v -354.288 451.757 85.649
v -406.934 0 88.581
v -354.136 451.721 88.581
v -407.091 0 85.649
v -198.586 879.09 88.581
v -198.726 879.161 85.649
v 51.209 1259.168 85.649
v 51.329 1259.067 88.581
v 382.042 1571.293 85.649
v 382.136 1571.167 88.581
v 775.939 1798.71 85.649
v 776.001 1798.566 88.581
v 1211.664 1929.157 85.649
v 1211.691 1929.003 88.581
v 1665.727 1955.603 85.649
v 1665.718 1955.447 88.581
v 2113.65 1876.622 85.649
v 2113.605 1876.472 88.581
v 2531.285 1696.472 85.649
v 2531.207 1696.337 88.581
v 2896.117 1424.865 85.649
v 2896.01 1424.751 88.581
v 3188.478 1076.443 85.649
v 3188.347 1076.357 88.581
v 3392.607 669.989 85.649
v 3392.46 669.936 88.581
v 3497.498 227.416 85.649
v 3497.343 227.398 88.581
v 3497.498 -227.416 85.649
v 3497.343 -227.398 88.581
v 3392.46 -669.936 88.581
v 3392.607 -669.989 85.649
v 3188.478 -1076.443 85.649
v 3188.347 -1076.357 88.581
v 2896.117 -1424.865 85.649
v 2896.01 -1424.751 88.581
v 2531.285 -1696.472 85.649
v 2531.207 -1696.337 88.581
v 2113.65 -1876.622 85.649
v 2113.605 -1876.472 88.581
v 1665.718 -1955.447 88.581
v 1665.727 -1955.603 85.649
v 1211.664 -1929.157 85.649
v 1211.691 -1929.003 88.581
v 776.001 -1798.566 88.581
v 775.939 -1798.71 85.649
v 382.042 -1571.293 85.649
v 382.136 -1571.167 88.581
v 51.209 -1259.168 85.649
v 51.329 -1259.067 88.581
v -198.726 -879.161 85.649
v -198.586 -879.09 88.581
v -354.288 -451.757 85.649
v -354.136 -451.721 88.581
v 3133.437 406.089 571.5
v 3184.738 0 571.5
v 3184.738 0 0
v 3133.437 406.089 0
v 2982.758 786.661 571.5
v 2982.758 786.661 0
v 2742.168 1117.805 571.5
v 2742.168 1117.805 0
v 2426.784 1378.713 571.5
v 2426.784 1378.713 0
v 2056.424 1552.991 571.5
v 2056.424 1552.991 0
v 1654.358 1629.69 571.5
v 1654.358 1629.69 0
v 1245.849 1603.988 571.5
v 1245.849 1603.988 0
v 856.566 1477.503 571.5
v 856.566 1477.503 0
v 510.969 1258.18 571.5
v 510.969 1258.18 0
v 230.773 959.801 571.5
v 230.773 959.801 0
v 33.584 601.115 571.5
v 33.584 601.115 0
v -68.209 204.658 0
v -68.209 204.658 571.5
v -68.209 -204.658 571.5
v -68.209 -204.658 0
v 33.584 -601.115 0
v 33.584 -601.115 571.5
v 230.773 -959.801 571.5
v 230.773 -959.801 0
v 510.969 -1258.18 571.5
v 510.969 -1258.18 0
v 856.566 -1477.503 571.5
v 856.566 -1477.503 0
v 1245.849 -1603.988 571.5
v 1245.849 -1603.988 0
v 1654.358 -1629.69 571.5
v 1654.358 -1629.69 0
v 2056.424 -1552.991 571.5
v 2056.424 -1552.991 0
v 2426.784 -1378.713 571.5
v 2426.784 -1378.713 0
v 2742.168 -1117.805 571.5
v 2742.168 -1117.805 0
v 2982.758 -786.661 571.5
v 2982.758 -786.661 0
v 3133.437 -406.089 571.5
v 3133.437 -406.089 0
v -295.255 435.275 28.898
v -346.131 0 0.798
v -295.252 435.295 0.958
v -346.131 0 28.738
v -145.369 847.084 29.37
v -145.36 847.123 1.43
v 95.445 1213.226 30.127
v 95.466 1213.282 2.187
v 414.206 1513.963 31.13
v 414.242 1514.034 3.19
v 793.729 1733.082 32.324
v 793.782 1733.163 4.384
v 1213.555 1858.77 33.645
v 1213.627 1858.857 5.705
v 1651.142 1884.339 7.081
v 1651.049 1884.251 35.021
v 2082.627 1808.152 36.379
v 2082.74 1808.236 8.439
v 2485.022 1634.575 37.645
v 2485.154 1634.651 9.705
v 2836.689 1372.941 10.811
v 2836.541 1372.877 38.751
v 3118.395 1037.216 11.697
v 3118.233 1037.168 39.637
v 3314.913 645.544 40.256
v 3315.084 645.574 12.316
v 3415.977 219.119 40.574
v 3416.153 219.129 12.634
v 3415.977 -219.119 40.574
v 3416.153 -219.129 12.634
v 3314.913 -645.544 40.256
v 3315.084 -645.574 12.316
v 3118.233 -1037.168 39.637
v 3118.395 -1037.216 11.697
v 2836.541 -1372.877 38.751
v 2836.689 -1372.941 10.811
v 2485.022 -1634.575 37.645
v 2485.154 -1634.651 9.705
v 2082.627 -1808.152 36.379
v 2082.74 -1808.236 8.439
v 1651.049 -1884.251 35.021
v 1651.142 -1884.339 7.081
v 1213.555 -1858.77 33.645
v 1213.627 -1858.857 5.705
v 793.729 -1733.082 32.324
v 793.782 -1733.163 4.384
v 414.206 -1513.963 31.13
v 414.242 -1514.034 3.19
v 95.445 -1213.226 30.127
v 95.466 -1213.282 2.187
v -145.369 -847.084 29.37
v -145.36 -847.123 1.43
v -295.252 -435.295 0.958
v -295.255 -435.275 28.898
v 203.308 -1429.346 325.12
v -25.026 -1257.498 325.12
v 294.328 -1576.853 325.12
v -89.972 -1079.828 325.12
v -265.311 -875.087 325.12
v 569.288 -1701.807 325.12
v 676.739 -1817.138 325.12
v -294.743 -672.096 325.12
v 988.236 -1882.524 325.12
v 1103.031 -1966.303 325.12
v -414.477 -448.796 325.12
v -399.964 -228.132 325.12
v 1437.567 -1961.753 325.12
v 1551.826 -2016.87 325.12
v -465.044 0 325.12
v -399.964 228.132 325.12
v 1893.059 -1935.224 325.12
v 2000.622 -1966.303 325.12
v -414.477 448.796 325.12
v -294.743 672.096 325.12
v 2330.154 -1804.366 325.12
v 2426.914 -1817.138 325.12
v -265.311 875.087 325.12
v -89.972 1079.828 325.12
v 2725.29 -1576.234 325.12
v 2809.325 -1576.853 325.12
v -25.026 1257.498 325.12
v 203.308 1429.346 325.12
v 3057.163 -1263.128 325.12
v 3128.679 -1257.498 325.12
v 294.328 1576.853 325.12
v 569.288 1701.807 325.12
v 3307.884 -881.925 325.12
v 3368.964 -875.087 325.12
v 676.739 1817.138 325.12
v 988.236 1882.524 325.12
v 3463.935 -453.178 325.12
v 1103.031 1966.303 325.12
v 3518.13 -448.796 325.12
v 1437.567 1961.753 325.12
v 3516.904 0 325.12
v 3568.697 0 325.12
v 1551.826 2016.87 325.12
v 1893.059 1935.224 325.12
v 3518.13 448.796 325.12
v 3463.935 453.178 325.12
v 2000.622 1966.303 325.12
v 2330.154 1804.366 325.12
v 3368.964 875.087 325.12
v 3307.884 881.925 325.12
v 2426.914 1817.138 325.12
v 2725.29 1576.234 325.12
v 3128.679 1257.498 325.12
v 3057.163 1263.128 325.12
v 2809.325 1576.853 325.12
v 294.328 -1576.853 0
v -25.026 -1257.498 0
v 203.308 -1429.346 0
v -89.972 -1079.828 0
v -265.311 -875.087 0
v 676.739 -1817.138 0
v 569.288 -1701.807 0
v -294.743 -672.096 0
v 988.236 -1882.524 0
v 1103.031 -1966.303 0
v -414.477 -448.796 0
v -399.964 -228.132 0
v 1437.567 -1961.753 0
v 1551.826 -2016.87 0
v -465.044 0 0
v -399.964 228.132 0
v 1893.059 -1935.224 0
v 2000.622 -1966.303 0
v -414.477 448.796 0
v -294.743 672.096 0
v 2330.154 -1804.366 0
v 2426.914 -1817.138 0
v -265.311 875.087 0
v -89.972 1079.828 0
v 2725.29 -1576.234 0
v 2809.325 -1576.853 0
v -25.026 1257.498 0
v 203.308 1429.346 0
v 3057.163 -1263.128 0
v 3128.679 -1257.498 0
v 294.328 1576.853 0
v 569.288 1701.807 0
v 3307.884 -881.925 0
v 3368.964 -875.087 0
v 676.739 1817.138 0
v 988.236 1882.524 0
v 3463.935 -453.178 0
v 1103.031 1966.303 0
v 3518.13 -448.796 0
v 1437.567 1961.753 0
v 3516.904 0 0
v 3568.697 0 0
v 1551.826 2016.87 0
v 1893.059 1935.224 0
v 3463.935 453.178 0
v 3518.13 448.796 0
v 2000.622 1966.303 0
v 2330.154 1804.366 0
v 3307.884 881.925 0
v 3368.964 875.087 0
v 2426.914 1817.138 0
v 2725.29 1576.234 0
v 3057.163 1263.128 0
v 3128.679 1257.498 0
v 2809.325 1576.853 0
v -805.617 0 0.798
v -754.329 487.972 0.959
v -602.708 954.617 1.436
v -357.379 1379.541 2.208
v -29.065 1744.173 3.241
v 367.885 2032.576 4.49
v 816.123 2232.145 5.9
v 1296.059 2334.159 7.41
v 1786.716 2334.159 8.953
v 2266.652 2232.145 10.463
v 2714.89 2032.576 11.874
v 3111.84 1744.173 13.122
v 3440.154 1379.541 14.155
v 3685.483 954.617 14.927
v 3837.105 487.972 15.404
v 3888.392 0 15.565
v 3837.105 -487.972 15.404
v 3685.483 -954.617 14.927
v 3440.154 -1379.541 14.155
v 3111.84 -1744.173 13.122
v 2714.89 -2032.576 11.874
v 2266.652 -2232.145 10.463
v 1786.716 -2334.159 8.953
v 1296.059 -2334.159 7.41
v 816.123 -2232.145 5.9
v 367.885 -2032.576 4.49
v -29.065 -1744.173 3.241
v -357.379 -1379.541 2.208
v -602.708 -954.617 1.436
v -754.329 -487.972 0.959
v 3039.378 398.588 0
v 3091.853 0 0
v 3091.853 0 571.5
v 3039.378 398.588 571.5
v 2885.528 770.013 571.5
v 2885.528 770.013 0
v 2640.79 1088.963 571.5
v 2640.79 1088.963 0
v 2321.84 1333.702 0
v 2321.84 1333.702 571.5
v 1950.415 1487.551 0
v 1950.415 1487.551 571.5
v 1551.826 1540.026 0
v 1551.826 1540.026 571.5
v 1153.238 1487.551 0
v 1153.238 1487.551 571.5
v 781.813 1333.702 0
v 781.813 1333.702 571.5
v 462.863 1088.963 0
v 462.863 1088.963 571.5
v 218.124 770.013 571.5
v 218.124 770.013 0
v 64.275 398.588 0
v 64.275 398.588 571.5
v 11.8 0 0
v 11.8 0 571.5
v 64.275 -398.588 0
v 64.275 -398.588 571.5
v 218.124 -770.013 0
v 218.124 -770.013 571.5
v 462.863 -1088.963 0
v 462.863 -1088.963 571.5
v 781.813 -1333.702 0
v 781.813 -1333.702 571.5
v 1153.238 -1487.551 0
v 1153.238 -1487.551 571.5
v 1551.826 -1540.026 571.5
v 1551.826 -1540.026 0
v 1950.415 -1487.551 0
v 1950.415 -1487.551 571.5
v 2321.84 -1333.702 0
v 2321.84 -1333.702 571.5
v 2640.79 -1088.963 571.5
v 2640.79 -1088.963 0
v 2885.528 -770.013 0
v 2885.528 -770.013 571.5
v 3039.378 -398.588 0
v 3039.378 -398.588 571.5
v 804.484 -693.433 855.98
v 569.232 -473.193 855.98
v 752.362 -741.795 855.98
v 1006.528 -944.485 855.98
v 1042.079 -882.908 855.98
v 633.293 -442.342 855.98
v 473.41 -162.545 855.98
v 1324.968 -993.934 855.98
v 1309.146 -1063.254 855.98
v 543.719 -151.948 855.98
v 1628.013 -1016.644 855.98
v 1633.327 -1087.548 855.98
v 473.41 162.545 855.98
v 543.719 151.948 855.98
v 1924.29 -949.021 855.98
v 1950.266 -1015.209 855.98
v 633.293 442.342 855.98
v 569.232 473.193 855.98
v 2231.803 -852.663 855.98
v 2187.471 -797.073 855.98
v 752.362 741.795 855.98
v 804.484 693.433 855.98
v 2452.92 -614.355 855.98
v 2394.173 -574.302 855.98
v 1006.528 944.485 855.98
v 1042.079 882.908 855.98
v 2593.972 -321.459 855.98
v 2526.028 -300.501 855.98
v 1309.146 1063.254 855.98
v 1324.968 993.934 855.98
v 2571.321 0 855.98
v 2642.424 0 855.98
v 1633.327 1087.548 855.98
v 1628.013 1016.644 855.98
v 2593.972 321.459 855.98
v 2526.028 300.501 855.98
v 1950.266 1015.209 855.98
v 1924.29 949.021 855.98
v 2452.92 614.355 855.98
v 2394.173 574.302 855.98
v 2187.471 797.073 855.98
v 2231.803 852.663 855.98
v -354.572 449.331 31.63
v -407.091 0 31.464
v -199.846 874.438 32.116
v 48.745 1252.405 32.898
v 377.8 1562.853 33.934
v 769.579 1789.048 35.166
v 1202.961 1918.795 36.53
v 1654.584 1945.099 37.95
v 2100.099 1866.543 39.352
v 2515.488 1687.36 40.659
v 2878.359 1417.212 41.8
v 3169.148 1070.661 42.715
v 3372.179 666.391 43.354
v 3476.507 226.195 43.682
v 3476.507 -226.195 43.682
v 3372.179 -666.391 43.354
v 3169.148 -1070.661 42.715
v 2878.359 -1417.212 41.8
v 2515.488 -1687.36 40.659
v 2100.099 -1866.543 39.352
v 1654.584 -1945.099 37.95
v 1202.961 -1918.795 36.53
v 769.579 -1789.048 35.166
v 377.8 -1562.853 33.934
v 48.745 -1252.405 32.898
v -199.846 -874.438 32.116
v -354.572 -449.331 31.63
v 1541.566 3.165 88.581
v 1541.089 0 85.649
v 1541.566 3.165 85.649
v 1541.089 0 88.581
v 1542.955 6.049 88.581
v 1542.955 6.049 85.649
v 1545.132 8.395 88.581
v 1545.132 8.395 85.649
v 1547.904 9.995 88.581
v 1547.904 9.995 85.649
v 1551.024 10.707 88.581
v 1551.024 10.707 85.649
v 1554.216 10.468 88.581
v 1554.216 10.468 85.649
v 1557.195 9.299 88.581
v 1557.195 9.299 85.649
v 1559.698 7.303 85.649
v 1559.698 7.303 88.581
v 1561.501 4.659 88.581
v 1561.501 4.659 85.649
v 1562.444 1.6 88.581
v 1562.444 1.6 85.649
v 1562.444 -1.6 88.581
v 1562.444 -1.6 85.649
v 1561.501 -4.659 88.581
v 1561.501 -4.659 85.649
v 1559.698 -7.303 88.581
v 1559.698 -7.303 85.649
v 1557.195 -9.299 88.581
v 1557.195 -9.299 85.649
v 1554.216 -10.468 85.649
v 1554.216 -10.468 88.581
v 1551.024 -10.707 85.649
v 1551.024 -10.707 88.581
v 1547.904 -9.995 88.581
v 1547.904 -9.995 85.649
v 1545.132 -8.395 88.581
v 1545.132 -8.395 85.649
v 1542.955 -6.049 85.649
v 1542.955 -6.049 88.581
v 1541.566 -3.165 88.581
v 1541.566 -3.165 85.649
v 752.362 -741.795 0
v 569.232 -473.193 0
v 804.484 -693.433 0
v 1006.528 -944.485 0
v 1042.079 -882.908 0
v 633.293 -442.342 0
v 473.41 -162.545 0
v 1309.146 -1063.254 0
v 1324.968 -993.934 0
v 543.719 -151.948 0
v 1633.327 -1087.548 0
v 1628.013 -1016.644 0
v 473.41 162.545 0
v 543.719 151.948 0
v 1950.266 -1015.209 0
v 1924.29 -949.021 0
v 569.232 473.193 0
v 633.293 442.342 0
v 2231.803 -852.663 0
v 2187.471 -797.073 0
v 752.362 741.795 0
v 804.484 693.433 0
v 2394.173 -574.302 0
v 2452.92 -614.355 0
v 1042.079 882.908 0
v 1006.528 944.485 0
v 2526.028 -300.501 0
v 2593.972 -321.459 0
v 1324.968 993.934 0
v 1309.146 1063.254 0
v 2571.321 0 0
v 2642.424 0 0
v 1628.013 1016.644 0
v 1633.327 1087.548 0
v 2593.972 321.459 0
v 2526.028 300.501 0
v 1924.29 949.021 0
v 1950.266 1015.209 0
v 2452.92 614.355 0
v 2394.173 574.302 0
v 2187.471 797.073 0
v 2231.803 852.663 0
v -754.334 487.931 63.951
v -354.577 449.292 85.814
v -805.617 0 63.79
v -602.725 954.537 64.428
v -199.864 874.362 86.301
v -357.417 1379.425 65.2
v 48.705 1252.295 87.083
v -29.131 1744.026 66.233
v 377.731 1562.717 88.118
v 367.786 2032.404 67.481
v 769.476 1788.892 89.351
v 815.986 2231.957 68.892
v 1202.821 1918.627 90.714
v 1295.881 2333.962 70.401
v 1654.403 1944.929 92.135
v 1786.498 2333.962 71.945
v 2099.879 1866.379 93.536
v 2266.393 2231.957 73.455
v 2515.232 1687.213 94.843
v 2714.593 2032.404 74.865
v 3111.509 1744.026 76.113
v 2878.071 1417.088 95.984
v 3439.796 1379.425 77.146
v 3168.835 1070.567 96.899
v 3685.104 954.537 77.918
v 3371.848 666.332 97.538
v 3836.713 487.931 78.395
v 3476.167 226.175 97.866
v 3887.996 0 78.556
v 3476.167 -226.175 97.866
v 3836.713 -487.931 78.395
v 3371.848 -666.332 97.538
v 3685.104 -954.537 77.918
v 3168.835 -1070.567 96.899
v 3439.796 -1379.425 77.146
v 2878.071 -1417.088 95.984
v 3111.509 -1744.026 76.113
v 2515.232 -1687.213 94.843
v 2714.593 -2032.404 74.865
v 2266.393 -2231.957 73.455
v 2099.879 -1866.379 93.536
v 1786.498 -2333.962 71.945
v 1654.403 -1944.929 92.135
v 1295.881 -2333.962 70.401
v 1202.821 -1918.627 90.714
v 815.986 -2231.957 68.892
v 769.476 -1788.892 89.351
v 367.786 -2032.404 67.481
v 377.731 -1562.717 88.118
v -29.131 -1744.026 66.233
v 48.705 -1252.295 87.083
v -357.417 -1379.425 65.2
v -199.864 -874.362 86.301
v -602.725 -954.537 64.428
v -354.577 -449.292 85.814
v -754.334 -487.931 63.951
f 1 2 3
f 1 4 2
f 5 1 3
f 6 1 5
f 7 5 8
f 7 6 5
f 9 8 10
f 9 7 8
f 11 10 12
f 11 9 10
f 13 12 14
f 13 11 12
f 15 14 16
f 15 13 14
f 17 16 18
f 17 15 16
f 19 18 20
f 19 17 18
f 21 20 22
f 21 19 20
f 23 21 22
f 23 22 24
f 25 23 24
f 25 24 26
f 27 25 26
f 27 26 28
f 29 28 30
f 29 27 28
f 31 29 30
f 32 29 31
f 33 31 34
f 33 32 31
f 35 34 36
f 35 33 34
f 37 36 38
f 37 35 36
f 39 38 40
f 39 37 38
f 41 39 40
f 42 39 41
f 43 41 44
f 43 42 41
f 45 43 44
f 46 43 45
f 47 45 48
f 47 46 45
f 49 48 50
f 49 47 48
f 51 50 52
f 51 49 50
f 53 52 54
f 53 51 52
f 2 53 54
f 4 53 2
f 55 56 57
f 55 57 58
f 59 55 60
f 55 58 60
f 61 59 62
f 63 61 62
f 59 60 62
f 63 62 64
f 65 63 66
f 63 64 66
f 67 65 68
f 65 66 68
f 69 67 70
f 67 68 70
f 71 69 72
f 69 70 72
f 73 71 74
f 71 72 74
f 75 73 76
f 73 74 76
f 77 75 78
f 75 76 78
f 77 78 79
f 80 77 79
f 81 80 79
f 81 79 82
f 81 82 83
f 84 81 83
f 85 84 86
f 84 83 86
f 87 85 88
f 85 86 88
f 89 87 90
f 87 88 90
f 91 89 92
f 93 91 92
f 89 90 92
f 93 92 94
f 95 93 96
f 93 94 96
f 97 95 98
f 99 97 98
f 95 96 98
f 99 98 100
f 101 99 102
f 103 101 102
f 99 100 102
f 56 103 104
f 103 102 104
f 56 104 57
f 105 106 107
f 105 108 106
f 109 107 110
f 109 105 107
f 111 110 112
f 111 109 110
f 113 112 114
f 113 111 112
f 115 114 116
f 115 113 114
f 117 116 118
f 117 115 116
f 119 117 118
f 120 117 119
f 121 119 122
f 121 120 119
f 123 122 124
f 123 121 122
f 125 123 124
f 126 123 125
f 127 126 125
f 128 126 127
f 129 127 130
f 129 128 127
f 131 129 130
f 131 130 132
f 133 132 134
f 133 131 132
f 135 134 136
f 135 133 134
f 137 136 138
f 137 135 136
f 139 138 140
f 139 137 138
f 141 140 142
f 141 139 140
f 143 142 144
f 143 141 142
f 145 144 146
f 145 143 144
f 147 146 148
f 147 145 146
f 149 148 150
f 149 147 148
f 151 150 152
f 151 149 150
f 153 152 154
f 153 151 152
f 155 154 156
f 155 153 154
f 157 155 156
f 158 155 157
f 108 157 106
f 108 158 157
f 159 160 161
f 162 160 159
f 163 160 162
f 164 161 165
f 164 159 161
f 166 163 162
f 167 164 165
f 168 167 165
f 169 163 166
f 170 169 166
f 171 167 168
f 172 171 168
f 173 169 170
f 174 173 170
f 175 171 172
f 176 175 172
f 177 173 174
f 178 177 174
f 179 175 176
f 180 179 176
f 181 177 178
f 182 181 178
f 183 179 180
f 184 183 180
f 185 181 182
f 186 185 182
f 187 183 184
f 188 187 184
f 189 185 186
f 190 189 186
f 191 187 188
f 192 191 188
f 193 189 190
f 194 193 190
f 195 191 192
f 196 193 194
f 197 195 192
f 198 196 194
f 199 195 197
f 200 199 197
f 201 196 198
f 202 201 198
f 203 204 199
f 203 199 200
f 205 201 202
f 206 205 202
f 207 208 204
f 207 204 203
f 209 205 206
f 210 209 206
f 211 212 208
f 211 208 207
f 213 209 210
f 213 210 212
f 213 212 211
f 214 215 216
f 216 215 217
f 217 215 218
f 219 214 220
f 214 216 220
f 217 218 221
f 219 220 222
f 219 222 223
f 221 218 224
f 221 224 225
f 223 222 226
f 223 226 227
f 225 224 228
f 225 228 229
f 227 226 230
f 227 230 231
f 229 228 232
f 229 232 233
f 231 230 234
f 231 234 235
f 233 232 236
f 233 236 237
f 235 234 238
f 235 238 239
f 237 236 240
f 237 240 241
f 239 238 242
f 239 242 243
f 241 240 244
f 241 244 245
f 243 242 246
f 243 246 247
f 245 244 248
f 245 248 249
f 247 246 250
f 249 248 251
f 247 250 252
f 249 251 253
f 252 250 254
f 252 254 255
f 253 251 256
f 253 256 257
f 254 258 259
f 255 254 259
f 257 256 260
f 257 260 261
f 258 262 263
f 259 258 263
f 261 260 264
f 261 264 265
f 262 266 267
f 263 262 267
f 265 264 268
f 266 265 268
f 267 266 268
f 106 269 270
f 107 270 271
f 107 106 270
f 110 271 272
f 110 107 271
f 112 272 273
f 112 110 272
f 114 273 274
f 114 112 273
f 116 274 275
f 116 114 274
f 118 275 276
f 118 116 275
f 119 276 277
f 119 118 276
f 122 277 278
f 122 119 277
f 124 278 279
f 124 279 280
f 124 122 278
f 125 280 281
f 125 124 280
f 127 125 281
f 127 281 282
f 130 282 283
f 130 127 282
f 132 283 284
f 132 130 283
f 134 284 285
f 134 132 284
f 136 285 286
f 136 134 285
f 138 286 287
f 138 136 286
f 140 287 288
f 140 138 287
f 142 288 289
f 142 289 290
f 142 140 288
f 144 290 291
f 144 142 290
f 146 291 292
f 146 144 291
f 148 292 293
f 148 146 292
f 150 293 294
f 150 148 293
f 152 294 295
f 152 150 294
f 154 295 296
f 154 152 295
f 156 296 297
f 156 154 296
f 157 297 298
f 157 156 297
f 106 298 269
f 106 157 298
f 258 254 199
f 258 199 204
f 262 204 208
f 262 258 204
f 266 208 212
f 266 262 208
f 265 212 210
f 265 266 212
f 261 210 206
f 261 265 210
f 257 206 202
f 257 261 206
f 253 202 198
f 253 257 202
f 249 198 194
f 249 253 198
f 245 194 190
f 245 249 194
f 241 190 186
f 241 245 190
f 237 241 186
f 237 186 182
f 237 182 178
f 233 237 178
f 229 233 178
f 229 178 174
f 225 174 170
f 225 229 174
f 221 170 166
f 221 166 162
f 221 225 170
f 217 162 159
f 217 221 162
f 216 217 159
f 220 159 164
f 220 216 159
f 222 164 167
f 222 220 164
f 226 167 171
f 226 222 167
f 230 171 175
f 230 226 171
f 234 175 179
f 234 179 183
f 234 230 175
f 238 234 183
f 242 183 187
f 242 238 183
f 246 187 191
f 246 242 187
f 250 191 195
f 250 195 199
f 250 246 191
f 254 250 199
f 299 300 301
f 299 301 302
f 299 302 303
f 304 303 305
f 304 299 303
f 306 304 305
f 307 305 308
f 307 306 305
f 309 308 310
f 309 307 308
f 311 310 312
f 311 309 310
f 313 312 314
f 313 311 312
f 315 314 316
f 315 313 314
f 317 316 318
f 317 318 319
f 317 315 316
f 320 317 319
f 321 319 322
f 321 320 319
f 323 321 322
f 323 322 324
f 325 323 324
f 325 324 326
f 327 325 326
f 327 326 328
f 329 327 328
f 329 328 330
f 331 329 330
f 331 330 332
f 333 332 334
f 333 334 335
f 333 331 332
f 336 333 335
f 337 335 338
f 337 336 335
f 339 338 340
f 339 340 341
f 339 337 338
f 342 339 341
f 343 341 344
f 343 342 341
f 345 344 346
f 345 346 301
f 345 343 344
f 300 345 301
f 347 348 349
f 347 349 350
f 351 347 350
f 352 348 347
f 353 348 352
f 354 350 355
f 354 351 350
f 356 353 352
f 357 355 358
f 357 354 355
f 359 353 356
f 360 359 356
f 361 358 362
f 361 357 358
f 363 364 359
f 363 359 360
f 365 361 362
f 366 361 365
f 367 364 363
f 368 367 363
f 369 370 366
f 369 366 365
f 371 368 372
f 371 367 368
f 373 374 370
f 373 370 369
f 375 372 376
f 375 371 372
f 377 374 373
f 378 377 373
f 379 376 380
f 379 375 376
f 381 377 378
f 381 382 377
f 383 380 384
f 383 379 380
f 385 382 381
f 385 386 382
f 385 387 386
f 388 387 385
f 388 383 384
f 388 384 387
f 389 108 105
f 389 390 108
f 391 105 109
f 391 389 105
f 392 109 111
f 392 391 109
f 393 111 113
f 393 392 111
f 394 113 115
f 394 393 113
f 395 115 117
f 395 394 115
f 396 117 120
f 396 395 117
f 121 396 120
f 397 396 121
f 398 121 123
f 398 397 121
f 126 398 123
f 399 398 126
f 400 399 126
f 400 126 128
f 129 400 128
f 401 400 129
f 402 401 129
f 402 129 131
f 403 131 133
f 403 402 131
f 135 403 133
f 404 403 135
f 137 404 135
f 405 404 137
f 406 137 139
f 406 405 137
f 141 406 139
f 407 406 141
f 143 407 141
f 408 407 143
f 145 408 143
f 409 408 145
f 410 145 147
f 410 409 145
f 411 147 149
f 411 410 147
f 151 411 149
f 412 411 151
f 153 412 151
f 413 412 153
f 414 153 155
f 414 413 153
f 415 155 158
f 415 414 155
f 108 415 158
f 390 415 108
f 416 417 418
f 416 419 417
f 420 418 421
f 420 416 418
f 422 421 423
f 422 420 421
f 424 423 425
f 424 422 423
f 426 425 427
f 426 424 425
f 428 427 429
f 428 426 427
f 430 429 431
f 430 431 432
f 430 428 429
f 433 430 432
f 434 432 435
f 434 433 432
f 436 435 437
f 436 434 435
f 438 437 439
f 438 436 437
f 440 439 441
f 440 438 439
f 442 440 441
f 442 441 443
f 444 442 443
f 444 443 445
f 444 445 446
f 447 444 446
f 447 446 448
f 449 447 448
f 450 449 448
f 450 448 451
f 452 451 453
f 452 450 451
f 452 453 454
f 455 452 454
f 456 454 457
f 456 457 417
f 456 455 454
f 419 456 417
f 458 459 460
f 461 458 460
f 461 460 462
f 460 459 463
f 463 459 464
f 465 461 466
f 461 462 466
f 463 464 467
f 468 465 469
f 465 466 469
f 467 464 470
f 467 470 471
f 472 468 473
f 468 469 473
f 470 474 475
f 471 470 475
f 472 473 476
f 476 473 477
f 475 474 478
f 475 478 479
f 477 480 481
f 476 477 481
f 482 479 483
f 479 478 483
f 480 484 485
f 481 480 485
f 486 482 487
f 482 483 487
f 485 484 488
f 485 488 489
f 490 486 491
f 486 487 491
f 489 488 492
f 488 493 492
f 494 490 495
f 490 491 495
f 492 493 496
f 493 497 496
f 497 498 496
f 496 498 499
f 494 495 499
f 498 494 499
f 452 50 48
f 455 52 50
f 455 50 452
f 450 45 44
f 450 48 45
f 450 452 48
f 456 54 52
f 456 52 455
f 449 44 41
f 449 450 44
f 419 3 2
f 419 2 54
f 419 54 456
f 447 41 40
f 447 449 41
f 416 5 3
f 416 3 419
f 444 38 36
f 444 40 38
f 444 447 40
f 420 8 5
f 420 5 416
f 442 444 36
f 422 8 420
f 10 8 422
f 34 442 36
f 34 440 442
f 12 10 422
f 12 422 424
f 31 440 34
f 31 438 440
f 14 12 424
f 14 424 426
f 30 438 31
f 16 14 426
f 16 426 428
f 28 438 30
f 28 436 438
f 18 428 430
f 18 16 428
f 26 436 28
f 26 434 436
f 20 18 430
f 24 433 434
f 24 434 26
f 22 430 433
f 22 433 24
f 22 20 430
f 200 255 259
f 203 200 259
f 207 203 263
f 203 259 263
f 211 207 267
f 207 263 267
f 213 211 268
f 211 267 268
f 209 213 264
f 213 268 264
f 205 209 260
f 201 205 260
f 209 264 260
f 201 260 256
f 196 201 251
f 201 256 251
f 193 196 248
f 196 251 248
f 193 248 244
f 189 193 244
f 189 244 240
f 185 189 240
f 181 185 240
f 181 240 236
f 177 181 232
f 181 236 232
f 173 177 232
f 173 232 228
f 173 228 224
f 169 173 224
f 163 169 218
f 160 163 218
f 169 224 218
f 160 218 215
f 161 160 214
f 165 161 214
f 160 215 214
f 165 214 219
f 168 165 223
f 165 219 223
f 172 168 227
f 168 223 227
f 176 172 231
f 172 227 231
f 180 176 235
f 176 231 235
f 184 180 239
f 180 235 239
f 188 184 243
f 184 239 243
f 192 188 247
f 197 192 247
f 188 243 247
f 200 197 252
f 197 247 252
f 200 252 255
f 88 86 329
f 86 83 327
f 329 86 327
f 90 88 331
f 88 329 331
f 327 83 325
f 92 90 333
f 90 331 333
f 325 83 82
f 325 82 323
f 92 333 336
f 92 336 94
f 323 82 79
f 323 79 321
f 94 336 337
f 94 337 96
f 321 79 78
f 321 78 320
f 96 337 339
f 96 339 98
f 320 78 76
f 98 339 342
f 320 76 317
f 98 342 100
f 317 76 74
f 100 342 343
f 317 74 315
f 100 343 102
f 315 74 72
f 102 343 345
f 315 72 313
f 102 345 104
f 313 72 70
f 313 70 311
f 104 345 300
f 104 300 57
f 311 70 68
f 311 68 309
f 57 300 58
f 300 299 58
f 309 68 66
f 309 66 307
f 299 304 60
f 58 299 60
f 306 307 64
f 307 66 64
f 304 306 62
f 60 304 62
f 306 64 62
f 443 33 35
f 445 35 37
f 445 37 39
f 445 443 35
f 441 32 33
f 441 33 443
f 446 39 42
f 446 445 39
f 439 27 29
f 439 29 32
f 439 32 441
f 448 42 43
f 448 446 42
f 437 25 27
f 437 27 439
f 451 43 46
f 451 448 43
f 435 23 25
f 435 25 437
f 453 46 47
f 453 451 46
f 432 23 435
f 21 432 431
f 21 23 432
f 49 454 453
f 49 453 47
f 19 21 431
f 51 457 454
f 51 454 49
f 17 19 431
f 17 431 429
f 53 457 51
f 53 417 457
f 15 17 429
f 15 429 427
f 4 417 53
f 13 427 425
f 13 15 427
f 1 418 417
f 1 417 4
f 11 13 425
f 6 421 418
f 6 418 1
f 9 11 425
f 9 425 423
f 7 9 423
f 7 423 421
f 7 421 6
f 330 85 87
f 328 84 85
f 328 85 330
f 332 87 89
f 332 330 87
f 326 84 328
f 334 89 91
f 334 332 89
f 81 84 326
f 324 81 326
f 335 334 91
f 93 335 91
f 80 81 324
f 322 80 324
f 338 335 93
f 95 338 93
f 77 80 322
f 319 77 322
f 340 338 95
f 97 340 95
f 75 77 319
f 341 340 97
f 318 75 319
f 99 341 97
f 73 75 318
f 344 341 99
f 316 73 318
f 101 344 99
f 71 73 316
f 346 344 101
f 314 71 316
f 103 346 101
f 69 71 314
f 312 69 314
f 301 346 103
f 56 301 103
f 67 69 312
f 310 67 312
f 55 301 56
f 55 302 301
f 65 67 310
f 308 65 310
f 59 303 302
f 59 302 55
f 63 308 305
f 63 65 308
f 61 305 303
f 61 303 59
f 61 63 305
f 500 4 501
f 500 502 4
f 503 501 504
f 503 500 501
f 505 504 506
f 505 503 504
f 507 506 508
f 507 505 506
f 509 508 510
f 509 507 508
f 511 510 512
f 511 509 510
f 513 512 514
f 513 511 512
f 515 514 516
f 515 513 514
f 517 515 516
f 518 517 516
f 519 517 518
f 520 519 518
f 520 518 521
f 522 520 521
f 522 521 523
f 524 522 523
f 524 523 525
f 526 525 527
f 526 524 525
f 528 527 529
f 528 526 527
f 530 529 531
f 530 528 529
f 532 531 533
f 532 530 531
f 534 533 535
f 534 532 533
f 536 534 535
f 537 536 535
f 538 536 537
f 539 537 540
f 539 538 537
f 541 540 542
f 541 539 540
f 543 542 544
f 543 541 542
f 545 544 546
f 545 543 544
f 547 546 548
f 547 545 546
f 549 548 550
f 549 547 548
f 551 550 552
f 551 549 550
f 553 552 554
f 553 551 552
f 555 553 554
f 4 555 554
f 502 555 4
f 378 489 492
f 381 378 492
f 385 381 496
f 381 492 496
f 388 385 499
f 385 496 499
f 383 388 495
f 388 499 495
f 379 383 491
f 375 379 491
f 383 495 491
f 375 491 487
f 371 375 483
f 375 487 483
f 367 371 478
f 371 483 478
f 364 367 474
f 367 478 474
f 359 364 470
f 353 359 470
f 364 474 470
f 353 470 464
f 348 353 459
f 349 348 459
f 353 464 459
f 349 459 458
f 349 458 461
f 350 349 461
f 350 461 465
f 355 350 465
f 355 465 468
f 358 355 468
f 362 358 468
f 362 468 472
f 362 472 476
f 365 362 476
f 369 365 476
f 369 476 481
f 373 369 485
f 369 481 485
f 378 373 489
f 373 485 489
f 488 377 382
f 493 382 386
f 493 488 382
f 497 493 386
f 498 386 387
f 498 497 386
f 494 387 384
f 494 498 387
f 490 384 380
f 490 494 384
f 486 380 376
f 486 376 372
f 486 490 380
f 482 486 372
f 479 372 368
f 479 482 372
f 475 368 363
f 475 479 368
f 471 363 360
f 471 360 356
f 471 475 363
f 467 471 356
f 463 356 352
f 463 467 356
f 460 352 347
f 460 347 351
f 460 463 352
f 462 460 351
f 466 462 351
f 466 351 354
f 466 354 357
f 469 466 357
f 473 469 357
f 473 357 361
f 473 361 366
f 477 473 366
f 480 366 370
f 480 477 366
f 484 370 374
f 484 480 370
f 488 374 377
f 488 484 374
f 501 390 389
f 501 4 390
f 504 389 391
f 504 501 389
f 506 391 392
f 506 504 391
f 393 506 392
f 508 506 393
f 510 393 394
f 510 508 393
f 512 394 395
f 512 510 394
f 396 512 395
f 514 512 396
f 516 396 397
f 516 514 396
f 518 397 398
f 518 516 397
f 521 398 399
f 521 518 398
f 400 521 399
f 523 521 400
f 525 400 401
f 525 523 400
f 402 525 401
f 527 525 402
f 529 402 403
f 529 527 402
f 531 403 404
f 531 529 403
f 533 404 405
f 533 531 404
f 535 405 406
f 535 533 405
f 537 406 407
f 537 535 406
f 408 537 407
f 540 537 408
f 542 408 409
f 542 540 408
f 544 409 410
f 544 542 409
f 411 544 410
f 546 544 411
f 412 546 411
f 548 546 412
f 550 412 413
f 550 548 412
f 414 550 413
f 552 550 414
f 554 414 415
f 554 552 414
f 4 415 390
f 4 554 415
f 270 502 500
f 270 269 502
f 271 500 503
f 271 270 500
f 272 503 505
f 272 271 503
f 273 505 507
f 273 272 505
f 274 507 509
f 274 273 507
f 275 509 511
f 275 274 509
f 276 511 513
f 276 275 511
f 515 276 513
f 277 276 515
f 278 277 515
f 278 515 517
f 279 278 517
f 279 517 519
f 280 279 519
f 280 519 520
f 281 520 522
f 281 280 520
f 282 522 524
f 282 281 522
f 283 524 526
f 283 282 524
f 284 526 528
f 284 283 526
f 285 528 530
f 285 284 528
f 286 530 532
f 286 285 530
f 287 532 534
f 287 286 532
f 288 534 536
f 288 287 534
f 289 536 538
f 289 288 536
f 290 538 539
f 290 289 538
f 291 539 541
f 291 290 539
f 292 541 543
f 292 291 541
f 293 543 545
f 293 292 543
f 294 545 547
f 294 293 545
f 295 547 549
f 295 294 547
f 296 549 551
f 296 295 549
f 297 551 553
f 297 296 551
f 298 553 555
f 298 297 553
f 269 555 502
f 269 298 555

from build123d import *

# Parameters (mm, degrees)
F2_R     = 2016.870479
F2_R_2   = 1965.077709
F3_DEPTH = 325.12
F2_R_3   = 1632.911721
F2_R_4   = 1540.026415
F4_DEPTH = 571.5
F2_R_5   = 1090.59748
F2_R_6   = 1019.494864
F5_DEPTH = 855.98


with BuildPart() as f1:
    # F0 (on Front) → F1 (revolve)
    with BuildSketch(Plane.XZ):
        Polygon((-805.616917, 0.797942), (-346.130917, 0.797942), (-346.130917, 28.737942), (-407.090917, 31.464389), (-407.090917, 85.649182), (-805.616917, 63.789942), align=None)
    revolve(axis=Axis((1541.172492, 0, 76.569489), (0.003146, 0, -0.999995)))


with BuildPart() as f3:
    # F2 (on Top) → F3 (new body)
    with BuildSketch(Plane.XY):
        with Locations((1551.826477, 0)):
            Circle(F2_R)
        with Locations((1551.826477, 0)):
            Circle(F2_R_2, mode=Mode.SUBTRACT)
    extrude(amount=F3_DEPTH)


with BuildPart() as f4:
    # F2 (on Top) → F4 (new body)
    with BuildSketch(Plane.XY):
        with Locations((1551.826477, 0)):
            Circle(F2_R_3)
        with Locations((1551.826477, 0)):
            Circle(F2_R_4, mode=Mode.SUBTRACT)
    extrude(amount=F4_DEPTH)


with BuildPart() as f5:
    # F2 (on Top) → F5 (new body)
    with BuildSketch(Plane.XY):
        with Locations((1551.826477, 0)):
            Circle(F2_R_5)
        with Locations((1551.826477, 0)):
            Circle(F2_R_6, mode=Mode.SUBTRACT)
    extrude(amount=F5_DEPTH)


with BuildPart() as f6:
    # F0 (on Front) → F6 (revolve)
    with BuildSketch(Plane.XZ):
        Polygon((-406.934291, 88.58078), (-407.090917, 85.649182), (1541.089083, 85.649182), (1541.089083, 88.58078), align=None)
    revolve(axis=Axis((1551.826477, 0, 0), (0, 0, -1)))


solid = Compound([f1.part, f3.part, f4.part, f5.part, f6.part])
